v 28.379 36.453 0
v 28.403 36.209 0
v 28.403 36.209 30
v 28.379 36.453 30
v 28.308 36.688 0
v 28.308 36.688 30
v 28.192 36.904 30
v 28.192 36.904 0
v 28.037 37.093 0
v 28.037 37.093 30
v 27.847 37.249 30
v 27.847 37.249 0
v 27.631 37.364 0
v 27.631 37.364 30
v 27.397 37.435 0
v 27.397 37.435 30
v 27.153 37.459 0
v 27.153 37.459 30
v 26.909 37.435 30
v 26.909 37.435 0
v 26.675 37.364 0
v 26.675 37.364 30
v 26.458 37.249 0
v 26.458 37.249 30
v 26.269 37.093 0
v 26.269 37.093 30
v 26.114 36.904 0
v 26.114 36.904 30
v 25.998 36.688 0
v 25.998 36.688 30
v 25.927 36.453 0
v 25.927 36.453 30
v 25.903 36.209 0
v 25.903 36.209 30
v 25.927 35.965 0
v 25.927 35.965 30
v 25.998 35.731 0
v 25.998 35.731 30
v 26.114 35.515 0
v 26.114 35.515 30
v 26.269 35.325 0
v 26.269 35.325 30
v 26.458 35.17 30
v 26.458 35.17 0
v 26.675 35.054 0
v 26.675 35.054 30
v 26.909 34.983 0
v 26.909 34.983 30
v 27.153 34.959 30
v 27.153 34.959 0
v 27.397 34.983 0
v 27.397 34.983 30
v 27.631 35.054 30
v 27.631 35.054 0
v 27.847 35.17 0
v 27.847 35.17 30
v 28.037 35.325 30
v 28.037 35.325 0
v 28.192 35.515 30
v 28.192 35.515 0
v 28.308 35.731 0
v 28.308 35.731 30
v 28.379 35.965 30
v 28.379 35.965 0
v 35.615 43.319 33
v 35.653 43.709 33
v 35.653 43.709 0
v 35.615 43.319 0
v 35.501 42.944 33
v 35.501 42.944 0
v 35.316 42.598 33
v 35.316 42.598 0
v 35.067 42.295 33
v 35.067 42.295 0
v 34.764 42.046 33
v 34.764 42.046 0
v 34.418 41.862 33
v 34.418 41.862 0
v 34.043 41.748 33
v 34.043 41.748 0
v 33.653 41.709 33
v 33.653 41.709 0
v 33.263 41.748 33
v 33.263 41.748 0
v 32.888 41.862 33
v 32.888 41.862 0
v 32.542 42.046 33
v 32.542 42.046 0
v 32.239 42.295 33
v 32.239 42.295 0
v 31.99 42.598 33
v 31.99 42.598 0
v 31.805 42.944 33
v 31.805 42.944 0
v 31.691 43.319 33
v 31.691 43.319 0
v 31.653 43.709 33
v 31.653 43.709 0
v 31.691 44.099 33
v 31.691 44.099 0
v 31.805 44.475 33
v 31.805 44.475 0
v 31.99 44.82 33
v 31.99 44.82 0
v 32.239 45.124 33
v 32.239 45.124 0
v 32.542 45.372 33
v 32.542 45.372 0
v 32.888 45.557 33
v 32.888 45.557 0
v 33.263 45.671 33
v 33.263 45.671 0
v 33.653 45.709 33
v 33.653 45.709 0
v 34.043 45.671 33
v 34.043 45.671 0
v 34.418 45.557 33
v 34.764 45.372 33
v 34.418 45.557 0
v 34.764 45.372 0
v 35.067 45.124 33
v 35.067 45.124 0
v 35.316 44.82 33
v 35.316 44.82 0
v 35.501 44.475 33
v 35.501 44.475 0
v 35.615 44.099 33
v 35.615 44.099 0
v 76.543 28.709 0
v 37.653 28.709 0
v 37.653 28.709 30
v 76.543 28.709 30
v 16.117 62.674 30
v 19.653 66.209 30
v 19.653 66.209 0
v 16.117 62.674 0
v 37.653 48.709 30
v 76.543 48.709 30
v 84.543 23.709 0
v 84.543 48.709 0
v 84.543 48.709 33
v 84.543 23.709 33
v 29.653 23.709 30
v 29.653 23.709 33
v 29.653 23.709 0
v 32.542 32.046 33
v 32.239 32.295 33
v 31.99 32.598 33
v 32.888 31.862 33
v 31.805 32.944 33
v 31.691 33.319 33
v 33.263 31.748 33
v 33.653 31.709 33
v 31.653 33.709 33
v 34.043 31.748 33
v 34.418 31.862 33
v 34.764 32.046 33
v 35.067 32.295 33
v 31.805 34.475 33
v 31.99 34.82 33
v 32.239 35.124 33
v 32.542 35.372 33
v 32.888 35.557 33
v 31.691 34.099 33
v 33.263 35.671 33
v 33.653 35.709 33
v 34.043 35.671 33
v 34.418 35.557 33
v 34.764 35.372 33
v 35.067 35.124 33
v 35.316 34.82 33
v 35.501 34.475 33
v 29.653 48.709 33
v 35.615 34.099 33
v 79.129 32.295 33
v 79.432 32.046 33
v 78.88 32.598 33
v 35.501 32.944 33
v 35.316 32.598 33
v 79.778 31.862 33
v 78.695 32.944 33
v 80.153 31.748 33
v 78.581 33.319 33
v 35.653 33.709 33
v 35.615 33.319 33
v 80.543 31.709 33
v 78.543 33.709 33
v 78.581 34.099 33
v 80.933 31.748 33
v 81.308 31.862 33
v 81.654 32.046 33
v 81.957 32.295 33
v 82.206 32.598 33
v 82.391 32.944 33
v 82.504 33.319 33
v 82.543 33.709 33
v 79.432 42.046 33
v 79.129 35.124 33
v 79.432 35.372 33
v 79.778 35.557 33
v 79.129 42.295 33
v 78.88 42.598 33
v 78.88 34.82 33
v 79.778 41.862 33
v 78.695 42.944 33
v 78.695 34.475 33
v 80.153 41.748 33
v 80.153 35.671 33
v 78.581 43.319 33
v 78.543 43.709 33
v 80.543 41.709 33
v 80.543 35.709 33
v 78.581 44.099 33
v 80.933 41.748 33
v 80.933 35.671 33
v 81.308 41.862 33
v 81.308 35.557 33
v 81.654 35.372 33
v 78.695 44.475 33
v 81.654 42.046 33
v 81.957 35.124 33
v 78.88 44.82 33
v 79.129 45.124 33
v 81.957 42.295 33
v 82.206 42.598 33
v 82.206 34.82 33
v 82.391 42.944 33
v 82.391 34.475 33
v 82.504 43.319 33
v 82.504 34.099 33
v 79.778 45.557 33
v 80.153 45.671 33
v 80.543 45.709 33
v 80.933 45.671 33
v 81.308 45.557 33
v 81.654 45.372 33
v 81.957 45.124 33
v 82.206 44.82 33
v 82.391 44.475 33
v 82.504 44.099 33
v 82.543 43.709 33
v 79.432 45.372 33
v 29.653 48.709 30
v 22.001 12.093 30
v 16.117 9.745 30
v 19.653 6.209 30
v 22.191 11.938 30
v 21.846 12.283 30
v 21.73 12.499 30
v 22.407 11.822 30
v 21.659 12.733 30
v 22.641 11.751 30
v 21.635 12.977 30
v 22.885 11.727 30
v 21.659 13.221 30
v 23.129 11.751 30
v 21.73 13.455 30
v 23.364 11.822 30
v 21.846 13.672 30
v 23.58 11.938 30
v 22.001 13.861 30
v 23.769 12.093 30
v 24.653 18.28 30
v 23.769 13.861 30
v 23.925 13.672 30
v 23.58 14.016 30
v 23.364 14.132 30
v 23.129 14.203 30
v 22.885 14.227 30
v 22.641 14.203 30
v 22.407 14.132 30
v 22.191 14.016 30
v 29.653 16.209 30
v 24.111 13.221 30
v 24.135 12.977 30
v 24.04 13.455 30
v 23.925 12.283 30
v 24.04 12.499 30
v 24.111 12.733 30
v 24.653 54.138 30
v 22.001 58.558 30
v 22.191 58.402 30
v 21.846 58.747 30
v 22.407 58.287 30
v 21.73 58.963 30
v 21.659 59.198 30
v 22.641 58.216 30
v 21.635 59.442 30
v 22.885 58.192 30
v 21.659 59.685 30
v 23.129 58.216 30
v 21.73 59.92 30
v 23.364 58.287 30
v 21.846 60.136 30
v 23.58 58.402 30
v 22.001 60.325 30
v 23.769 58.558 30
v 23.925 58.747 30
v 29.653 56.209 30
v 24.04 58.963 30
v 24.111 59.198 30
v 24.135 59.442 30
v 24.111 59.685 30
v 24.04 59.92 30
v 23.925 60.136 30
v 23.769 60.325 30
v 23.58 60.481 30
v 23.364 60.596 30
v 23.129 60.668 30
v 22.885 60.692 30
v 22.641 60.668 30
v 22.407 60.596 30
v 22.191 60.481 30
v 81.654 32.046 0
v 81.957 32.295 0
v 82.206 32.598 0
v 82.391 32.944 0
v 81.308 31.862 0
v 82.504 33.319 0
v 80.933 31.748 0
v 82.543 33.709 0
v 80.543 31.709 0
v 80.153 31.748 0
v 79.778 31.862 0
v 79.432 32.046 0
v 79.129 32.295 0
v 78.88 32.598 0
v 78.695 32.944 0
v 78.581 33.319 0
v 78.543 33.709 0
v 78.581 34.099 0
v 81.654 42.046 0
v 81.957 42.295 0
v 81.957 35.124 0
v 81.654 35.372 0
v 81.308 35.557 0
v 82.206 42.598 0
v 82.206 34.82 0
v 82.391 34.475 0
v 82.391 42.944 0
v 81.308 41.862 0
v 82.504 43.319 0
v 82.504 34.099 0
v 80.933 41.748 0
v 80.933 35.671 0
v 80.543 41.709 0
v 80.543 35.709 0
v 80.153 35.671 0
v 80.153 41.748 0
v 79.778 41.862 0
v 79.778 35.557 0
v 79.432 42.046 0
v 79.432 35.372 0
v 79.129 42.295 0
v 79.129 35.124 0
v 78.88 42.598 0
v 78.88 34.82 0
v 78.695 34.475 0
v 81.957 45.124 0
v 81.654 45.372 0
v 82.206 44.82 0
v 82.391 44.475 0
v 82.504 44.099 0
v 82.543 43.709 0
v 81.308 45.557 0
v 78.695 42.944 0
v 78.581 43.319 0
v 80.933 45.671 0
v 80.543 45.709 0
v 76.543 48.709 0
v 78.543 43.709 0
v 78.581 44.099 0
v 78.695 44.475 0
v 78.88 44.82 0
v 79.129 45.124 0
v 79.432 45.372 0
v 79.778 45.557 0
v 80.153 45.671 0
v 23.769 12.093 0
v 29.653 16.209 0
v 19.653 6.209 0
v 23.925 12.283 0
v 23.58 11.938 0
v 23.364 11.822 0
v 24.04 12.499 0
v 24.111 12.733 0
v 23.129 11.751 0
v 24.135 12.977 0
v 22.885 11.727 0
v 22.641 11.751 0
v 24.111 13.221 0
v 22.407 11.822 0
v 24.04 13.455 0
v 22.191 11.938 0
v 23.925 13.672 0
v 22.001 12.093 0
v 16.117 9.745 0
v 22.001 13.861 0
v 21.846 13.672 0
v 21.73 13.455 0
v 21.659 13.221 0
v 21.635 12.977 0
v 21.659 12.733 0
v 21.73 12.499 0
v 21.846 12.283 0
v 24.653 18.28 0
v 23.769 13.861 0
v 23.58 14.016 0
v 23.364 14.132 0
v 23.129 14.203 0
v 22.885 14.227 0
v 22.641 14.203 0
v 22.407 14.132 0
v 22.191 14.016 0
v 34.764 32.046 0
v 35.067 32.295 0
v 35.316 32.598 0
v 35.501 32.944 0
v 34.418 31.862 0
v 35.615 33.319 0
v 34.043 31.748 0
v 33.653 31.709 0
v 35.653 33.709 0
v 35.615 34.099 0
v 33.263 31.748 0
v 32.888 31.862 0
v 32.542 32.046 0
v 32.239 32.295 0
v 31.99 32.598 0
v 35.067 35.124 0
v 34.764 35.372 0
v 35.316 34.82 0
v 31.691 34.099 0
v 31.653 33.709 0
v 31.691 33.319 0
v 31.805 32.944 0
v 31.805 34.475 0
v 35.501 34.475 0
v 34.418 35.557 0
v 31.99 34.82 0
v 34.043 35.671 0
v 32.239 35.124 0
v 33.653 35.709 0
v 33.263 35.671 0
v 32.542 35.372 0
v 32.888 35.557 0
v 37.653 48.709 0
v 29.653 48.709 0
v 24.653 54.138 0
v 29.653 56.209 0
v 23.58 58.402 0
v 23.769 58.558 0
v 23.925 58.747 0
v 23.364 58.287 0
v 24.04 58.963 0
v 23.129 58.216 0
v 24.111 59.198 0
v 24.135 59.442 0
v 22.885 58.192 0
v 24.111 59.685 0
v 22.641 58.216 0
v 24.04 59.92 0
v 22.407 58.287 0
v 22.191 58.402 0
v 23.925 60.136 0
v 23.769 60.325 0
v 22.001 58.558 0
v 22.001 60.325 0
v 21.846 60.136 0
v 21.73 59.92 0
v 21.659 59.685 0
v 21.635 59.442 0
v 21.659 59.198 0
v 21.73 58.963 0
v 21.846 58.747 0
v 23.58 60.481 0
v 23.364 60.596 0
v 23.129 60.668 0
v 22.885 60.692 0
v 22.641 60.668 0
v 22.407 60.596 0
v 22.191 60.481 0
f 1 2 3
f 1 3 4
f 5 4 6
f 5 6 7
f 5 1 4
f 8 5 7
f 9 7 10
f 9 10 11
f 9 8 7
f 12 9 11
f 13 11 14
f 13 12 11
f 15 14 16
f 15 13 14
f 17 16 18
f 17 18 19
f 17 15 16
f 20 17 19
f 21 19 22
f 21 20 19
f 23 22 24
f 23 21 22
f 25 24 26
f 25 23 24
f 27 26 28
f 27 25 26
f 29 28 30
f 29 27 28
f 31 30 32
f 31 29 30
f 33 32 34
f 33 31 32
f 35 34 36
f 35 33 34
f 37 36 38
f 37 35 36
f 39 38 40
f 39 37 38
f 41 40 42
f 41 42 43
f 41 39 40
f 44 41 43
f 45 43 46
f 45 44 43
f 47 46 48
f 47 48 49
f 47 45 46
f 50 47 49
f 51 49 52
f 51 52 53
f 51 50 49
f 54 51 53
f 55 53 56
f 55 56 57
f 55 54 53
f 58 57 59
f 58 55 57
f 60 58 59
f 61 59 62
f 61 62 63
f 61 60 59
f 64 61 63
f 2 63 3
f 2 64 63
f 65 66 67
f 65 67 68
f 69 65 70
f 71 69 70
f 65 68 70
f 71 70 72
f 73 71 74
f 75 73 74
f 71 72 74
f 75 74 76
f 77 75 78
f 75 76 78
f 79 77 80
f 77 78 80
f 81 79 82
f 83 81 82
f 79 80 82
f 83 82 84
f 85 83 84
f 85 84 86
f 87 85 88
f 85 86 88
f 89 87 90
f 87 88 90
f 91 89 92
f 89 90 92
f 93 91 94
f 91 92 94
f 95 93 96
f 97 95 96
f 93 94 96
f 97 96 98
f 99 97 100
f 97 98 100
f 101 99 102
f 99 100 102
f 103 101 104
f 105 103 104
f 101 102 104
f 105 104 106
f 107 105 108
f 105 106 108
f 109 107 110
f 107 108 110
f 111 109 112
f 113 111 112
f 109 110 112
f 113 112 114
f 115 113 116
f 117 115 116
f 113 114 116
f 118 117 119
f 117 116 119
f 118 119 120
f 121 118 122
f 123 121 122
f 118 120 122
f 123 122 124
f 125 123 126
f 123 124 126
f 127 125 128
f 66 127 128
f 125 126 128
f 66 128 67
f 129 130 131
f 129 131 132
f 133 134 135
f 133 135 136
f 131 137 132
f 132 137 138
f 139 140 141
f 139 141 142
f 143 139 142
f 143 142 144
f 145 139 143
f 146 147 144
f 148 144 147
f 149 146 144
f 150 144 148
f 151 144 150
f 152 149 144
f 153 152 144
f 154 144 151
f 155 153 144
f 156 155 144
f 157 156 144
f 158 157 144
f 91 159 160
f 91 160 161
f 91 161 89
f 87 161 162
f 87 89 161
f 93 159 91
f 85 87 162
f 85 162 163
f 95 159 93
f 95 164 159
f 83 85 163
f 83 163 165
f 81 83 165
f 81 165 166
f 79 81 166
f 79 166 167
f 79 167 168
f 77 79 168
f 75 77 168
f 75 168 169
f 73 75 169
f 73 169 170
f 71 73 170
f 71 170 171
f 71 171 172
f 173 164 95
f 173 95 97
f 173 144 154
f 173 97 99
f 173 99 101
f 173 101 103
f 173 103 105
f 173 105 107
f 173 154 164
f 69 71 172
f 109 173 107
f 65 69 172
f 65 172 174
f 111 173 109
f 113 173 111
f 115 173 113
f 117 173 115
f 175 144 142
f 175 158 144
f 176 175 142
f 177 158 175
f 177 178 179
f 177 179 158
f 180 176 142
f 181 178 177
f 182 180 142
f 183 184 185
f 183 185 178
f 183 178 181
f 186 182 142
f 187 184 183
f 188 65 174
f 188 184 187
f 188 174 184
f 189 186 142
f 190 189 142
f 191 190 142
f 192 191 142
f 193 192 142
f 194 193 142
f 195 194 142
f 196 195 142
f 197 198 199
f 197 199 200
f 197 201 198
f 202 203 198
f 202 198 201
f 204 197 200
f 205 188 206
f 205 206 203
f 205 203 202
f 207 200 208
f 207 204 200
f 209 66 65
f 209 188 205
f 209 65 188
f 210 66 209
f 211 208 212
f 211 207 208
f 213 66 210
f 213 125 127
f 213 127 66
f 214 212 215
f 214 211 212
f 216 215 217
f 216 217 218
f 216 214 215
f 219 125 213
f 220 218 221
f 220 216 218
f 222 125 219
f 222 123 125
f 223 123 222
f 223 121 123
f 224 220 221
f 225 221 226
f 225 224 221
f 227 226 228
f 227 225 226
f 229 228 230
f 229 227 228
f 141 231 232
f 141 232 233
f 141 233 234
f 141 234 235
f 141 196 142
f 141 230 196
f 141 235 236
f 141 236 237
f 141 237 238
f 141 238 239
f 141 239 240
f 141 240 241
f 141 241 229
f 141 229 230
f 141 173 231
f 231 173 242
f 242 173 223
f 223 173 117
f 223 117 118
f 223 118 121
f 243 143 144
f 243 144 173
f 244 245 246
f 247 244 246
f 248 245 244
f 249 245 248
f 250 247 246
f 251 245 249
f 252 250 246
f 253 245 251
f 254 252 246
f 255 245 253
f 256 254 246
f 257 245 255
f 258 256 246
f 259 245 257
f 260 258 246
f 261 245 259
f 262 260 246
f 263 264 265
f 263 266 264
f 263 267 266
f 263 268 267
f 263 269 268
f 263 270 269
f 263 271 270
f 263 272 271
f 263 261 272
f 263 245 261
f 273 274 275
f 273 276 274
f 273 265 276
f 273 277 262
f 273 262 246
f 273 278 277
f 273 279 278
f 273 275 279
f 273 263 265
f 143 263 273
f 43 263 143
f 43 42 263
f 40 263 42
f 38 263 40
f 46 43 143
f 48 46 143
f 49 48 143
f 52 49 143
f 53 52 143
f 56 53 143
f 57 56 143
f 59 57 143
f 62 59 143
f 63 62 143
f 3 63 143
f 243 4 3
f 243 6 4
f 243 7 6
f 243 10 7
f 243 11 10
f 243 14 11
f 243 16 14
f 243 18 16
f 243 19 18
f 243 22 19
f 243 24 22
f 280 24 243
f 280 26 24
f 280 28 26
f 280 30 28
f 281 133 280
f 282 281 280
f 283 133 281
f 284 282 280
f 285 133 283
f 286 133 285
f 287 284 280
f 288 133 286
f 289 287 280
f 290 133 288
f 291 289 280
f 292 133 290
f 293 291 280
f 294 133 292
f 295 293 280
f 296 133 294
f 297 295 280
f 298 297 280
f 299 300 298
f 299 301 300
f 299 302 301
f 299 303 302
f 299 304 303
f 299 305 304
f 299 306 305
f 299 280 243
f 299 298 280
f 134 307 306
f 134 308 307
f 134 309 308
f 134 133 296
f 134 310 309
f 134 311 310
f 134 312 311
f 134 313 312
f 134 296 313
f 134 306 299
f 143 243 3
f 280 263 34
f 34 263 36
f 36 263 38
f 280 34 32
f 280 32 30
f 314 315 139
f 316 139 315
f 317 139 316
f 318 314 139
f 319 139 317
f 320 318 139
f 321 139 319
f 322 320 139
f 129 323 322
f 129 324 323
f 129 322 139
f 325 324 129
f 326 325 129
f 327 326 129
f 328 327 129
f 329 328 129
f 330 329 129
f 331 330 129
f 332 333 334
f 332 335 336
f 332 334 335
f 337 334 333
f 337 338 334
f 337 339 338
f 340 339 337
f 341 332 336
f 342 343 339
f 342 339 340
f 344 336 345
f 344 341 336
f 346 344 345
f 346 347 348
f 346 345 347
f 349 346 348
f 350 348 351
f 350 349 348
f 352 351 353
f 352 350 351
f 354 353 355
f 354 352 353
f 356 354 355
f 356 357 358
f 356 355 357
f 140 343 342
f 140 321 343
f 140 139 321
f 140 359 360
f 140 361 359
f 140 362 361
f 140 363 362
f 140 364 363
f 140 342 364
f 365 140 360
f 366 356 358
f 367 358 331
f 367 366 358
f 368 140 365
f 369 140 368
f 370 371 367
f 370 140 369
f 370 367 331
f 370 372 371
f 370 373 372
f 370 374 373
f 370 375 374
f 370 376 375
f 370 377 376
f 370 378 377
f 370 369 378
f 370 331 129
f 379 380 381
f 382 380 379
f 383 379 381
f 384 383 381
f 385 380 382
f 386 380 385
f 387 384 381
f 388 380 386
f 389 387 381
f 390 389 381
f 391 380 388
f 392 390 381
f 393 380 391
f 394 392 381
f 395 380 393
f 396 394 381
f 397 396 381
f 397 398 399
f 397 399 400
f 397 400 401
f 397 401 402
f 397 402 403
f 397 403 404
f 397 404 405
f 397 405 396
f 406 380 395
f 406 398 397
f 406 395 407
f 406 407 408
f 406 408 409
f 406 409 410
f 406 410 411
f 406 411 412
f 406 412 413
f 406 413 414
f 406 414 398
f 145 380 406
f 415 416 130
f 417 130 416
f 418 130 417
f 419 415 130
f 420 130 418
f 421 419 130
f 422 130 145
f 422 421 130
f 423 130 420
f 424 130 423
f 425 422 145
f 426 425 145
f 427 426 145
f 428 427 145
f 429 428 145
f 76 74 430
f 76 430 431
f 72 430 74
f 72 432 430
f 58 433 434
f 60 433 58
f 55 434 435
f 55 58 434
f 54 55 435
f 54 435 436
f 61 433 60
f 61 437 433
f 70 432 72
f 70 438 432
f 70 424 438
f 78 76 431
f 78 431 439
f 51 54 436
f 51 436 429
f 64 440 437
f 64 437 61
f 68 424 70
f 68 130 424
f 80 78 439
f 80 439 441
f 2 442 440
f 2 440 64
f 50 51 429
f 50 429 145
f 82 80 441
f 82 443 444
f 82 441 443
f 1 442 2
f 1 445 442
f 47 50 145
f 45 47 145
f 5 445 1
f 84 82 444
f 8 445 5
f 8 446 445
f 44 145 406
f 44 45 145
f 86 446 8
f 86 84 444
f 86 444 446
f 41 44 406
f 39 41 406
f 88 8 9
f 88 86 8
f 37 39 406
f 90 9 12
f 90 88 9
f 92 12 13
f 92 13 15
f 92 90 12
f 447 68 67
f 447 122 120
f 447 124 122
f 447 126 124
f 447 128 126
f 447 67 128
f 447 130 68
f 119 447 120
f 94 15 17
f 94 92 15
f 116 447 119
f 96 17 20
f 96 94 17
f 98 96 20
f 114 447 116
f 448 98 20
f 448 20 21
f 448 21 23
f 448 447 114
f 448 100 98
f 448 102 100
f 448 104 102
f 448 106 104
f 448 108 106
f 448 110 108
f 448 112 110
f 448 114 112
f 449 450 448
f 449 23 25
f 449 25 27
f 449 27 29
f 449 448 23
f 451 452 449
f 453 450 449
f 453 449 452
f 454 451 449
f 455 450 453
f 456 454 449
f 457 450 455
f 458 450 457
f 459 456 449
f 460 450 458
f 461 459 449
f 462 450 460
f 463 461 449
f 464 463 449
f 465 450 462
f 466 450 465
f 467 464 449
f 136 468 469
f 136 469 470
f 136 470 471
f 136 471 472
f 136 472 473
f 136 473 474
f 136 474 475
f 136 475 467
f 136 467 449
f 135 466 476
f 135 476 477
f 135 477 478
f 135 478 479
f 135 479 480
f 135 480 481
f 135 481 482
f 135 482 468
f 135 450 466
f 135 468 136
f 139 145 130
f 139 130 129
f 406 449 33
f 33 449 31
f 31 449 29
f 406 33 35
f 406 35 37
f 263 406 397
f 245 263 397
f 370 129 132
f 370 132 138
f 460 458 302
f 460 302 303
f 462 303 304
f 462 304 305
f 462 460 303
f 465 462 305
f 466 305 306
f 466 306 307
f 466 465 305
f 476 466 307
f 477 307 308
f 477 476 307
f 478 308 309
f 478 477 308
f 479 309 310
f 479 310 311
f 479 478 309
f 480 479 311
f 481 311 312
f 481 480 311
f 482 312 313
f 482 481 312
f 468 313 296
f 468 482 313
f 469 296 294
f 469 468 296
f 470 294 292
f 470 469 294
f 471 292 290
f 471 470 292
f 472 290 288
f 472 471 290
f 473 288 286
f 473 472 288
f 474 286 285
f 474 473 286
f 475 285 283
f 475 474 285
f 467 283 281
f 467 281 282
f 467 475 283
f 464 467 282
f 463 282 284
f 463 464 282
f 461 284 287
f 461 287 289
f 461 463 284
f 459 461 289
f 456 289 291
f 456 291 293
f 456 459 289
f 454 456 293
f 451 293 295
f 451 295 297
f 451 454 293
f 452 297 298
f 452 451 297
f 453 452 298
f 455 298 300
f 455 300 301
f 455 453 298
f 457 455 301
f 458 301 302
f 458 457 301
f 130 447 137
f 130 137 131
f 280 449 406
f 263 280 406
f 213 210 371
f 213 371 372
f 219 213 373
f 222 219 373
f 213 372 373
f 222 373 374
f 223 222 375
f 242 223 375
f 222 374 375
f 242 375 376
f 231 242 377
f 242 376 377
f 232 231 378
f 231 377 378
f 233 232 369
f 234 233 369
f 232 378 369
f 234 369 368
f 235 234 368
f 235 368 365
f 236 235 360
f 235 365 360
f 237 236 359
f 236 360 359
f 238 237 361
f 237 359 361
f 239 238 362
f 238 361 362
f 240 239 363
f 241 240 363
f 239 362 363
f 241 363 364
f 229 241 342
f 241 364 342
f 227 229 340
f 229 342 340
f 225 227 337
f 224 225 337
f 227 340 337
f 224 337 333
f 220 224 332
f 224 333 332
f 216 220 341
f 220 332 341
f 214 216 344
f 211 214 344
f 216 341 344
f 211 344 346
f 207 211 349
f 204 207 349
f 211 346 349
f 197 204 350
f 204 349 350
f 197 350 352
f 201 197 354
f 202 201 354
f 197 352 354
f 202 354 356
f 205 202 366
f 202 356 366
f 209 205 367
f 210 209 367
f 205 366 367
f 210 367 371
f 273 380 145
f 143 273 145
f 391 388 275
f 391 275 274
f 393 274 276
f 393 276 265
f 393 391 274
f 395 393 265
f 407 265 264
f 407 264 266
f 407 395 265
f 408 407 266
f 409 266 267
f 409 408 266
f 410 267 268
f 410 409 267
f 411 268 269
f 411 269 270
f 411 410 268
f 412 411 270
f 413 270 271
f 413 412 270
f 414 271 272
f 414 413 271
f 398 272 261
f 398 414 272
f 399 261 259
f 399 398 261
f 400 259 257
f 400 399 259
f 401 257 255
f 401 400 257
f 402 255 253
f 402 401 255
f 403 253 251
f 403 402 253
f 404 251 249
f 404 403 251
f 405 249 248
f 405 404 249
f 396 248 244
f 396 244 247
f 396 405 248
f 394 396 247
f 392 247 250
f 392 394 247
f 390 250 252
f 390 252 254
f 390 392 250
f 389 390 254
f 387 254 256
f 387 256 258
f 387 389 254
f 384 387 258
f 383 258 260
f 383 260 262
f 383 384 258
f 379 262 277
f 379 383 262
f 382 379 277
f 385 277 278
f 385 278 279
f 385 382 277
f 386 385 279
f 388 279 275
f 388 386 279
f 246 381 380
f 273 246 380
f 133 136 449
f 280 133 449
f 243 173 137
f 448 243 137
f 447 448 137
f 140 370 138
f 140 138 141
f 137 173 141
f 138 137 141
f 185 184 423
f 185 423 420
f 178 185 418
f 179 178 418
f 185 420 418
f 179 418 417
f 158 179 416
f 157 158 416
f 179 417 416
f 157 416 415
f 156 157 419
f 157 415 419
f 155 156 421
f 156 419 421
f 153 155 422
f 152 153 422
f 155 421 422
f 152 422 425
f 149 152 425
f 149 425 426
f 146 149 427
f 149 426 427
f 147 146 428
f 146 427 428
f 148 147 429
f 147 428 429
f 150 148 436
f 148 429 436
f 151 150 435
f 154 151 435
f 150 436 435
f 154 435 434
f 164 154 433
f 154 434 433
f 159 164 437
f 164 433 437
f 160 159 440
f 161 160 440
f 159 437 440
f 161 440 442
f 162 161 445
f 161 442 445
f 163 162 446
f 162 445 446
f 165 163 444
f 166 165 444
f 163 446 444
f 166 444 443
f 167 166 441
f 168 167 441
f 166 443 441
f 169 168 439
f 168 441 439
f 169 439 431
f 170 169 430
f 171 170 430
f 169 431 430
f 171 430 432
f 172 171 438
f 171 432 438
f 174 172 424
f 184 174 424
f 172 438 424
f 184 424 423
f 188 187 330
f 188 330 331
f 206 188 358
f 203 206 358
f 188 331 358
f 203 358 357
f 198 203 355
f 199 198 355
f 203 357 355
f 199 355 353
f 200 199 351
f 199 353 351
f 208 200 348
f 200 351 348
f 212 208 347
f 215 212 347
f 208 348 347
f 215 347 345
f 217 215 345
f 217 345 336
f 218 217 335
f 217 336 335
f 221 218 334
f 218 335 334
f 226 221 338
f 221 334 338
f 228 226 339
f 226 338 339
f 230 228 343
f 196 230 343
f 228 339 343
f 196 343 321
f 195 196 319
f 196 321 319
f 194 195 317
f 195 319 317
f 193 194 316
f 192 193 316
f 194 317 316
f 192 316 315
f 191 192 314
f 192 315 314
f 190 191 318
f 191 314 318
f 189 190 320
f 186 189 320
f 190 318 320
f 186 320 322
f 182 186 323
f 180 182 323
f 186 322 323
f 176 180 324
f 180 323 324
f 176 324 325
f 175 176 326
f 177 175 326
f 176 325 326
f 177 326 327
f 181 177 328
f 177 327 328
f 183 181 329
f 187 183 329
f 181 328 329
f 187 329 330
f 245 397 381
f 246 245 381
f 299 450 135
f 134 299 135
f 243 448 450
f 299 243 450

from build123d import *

# Parameters (mm, degrees)
MODEL_R             = 1.25
BOSS_EXTRUDE1_DEPTH = 30
SKETCH1_R           = 2
BOSS_EXTRUDE3_DEPTH = 33
SKETCH3_W           = 38.889950408
SKETCH3_H           = 20
BOSS_EXTRUDE6_DEPTH = 3


with BuildPart() as part:
    # Model → Boss-Extrude1 (new body)
    with BuildSketch(Plane.XY):
        Polygon((29.652943866, 16.209286981), (29.652943866, 56.209286981), (19.652943866, 66.209286981), (16.11740996, 62.673753075), (24.652943866, 54.138219169), (24.652943866, 18.280354793), (16.11740996, 9.744820887), (19.652943866, 6.209286981), align=None)
        with Locations((22.885176913, 12.977053934)):
            Circle(MODEL_R, mode=Mode.SUBTRACT)
        with Locations((27.152943866, 36.209286981)):
            Circle(MODEL_R, mode=Mode.SUBTRACT)
        with Locations((22.885176913, 59.441520028)):
            Circle(MODEL_R, mode=Mode.SUBTRACT)
    extrude(amount=BOSS_EXTRUDE1_DEPTH)

    # Sketch1 → Boss-Extrude3 (add)
    with BuildSketch(Plane(origin=(0, 0, 0), x_dir=(-1, 0, 0), z_dir=(0, 0, -1))):
        Polygon((-37.652943866, 28.709286981), (-76.542894274, 28.709286981), (-76.542894274, 48.709286981), (-84.542894274, 48.709286981), (-84.542894274, 23.709286981), (-76.542894274, 23.709286981), (-29.652943866, 23.709286981), (-29.652943866, 28.709286981), (-29.652943866, 48.709286981), (-37.652943866, 48.709286981), align=None)
        with Locations((-80.542894274, 33.709286981)):
            Circle(SKETCH1_R, mode=Mode.SUBTRACT)
        with Locations((-80.542894274, 43.709286981)):
            Circle(SKETCH1_R, mode=Mode.SUBTRACT)
        with Locations(Location((-33.652943866, 33.709286981, 0), (0, 0, 180))):
            Circle(SKETCH1_R, mode=Mode.SUBTRACT)
        with Locations(Location((-33.652943866, 43.709286981, 0), (0, 0, 180))):
            Circle(SKETCH1_R, mode=Mode.SUBTRACT)
    extrude(amount=-BOSS_EXTRUDE3_DEPTH)

    # Sketch3 → Boss-Extrude6 (add)
    with BuildSketch(Plane.XY.offset(33)):
        with Locations((57.09791907, 38.709286981)):
            Rectangle(SKETCH3_W, SKETCH3_H)
    extrude(amount=-BOSS_EXTRUDE6_DEPTH)


solid = part.part
